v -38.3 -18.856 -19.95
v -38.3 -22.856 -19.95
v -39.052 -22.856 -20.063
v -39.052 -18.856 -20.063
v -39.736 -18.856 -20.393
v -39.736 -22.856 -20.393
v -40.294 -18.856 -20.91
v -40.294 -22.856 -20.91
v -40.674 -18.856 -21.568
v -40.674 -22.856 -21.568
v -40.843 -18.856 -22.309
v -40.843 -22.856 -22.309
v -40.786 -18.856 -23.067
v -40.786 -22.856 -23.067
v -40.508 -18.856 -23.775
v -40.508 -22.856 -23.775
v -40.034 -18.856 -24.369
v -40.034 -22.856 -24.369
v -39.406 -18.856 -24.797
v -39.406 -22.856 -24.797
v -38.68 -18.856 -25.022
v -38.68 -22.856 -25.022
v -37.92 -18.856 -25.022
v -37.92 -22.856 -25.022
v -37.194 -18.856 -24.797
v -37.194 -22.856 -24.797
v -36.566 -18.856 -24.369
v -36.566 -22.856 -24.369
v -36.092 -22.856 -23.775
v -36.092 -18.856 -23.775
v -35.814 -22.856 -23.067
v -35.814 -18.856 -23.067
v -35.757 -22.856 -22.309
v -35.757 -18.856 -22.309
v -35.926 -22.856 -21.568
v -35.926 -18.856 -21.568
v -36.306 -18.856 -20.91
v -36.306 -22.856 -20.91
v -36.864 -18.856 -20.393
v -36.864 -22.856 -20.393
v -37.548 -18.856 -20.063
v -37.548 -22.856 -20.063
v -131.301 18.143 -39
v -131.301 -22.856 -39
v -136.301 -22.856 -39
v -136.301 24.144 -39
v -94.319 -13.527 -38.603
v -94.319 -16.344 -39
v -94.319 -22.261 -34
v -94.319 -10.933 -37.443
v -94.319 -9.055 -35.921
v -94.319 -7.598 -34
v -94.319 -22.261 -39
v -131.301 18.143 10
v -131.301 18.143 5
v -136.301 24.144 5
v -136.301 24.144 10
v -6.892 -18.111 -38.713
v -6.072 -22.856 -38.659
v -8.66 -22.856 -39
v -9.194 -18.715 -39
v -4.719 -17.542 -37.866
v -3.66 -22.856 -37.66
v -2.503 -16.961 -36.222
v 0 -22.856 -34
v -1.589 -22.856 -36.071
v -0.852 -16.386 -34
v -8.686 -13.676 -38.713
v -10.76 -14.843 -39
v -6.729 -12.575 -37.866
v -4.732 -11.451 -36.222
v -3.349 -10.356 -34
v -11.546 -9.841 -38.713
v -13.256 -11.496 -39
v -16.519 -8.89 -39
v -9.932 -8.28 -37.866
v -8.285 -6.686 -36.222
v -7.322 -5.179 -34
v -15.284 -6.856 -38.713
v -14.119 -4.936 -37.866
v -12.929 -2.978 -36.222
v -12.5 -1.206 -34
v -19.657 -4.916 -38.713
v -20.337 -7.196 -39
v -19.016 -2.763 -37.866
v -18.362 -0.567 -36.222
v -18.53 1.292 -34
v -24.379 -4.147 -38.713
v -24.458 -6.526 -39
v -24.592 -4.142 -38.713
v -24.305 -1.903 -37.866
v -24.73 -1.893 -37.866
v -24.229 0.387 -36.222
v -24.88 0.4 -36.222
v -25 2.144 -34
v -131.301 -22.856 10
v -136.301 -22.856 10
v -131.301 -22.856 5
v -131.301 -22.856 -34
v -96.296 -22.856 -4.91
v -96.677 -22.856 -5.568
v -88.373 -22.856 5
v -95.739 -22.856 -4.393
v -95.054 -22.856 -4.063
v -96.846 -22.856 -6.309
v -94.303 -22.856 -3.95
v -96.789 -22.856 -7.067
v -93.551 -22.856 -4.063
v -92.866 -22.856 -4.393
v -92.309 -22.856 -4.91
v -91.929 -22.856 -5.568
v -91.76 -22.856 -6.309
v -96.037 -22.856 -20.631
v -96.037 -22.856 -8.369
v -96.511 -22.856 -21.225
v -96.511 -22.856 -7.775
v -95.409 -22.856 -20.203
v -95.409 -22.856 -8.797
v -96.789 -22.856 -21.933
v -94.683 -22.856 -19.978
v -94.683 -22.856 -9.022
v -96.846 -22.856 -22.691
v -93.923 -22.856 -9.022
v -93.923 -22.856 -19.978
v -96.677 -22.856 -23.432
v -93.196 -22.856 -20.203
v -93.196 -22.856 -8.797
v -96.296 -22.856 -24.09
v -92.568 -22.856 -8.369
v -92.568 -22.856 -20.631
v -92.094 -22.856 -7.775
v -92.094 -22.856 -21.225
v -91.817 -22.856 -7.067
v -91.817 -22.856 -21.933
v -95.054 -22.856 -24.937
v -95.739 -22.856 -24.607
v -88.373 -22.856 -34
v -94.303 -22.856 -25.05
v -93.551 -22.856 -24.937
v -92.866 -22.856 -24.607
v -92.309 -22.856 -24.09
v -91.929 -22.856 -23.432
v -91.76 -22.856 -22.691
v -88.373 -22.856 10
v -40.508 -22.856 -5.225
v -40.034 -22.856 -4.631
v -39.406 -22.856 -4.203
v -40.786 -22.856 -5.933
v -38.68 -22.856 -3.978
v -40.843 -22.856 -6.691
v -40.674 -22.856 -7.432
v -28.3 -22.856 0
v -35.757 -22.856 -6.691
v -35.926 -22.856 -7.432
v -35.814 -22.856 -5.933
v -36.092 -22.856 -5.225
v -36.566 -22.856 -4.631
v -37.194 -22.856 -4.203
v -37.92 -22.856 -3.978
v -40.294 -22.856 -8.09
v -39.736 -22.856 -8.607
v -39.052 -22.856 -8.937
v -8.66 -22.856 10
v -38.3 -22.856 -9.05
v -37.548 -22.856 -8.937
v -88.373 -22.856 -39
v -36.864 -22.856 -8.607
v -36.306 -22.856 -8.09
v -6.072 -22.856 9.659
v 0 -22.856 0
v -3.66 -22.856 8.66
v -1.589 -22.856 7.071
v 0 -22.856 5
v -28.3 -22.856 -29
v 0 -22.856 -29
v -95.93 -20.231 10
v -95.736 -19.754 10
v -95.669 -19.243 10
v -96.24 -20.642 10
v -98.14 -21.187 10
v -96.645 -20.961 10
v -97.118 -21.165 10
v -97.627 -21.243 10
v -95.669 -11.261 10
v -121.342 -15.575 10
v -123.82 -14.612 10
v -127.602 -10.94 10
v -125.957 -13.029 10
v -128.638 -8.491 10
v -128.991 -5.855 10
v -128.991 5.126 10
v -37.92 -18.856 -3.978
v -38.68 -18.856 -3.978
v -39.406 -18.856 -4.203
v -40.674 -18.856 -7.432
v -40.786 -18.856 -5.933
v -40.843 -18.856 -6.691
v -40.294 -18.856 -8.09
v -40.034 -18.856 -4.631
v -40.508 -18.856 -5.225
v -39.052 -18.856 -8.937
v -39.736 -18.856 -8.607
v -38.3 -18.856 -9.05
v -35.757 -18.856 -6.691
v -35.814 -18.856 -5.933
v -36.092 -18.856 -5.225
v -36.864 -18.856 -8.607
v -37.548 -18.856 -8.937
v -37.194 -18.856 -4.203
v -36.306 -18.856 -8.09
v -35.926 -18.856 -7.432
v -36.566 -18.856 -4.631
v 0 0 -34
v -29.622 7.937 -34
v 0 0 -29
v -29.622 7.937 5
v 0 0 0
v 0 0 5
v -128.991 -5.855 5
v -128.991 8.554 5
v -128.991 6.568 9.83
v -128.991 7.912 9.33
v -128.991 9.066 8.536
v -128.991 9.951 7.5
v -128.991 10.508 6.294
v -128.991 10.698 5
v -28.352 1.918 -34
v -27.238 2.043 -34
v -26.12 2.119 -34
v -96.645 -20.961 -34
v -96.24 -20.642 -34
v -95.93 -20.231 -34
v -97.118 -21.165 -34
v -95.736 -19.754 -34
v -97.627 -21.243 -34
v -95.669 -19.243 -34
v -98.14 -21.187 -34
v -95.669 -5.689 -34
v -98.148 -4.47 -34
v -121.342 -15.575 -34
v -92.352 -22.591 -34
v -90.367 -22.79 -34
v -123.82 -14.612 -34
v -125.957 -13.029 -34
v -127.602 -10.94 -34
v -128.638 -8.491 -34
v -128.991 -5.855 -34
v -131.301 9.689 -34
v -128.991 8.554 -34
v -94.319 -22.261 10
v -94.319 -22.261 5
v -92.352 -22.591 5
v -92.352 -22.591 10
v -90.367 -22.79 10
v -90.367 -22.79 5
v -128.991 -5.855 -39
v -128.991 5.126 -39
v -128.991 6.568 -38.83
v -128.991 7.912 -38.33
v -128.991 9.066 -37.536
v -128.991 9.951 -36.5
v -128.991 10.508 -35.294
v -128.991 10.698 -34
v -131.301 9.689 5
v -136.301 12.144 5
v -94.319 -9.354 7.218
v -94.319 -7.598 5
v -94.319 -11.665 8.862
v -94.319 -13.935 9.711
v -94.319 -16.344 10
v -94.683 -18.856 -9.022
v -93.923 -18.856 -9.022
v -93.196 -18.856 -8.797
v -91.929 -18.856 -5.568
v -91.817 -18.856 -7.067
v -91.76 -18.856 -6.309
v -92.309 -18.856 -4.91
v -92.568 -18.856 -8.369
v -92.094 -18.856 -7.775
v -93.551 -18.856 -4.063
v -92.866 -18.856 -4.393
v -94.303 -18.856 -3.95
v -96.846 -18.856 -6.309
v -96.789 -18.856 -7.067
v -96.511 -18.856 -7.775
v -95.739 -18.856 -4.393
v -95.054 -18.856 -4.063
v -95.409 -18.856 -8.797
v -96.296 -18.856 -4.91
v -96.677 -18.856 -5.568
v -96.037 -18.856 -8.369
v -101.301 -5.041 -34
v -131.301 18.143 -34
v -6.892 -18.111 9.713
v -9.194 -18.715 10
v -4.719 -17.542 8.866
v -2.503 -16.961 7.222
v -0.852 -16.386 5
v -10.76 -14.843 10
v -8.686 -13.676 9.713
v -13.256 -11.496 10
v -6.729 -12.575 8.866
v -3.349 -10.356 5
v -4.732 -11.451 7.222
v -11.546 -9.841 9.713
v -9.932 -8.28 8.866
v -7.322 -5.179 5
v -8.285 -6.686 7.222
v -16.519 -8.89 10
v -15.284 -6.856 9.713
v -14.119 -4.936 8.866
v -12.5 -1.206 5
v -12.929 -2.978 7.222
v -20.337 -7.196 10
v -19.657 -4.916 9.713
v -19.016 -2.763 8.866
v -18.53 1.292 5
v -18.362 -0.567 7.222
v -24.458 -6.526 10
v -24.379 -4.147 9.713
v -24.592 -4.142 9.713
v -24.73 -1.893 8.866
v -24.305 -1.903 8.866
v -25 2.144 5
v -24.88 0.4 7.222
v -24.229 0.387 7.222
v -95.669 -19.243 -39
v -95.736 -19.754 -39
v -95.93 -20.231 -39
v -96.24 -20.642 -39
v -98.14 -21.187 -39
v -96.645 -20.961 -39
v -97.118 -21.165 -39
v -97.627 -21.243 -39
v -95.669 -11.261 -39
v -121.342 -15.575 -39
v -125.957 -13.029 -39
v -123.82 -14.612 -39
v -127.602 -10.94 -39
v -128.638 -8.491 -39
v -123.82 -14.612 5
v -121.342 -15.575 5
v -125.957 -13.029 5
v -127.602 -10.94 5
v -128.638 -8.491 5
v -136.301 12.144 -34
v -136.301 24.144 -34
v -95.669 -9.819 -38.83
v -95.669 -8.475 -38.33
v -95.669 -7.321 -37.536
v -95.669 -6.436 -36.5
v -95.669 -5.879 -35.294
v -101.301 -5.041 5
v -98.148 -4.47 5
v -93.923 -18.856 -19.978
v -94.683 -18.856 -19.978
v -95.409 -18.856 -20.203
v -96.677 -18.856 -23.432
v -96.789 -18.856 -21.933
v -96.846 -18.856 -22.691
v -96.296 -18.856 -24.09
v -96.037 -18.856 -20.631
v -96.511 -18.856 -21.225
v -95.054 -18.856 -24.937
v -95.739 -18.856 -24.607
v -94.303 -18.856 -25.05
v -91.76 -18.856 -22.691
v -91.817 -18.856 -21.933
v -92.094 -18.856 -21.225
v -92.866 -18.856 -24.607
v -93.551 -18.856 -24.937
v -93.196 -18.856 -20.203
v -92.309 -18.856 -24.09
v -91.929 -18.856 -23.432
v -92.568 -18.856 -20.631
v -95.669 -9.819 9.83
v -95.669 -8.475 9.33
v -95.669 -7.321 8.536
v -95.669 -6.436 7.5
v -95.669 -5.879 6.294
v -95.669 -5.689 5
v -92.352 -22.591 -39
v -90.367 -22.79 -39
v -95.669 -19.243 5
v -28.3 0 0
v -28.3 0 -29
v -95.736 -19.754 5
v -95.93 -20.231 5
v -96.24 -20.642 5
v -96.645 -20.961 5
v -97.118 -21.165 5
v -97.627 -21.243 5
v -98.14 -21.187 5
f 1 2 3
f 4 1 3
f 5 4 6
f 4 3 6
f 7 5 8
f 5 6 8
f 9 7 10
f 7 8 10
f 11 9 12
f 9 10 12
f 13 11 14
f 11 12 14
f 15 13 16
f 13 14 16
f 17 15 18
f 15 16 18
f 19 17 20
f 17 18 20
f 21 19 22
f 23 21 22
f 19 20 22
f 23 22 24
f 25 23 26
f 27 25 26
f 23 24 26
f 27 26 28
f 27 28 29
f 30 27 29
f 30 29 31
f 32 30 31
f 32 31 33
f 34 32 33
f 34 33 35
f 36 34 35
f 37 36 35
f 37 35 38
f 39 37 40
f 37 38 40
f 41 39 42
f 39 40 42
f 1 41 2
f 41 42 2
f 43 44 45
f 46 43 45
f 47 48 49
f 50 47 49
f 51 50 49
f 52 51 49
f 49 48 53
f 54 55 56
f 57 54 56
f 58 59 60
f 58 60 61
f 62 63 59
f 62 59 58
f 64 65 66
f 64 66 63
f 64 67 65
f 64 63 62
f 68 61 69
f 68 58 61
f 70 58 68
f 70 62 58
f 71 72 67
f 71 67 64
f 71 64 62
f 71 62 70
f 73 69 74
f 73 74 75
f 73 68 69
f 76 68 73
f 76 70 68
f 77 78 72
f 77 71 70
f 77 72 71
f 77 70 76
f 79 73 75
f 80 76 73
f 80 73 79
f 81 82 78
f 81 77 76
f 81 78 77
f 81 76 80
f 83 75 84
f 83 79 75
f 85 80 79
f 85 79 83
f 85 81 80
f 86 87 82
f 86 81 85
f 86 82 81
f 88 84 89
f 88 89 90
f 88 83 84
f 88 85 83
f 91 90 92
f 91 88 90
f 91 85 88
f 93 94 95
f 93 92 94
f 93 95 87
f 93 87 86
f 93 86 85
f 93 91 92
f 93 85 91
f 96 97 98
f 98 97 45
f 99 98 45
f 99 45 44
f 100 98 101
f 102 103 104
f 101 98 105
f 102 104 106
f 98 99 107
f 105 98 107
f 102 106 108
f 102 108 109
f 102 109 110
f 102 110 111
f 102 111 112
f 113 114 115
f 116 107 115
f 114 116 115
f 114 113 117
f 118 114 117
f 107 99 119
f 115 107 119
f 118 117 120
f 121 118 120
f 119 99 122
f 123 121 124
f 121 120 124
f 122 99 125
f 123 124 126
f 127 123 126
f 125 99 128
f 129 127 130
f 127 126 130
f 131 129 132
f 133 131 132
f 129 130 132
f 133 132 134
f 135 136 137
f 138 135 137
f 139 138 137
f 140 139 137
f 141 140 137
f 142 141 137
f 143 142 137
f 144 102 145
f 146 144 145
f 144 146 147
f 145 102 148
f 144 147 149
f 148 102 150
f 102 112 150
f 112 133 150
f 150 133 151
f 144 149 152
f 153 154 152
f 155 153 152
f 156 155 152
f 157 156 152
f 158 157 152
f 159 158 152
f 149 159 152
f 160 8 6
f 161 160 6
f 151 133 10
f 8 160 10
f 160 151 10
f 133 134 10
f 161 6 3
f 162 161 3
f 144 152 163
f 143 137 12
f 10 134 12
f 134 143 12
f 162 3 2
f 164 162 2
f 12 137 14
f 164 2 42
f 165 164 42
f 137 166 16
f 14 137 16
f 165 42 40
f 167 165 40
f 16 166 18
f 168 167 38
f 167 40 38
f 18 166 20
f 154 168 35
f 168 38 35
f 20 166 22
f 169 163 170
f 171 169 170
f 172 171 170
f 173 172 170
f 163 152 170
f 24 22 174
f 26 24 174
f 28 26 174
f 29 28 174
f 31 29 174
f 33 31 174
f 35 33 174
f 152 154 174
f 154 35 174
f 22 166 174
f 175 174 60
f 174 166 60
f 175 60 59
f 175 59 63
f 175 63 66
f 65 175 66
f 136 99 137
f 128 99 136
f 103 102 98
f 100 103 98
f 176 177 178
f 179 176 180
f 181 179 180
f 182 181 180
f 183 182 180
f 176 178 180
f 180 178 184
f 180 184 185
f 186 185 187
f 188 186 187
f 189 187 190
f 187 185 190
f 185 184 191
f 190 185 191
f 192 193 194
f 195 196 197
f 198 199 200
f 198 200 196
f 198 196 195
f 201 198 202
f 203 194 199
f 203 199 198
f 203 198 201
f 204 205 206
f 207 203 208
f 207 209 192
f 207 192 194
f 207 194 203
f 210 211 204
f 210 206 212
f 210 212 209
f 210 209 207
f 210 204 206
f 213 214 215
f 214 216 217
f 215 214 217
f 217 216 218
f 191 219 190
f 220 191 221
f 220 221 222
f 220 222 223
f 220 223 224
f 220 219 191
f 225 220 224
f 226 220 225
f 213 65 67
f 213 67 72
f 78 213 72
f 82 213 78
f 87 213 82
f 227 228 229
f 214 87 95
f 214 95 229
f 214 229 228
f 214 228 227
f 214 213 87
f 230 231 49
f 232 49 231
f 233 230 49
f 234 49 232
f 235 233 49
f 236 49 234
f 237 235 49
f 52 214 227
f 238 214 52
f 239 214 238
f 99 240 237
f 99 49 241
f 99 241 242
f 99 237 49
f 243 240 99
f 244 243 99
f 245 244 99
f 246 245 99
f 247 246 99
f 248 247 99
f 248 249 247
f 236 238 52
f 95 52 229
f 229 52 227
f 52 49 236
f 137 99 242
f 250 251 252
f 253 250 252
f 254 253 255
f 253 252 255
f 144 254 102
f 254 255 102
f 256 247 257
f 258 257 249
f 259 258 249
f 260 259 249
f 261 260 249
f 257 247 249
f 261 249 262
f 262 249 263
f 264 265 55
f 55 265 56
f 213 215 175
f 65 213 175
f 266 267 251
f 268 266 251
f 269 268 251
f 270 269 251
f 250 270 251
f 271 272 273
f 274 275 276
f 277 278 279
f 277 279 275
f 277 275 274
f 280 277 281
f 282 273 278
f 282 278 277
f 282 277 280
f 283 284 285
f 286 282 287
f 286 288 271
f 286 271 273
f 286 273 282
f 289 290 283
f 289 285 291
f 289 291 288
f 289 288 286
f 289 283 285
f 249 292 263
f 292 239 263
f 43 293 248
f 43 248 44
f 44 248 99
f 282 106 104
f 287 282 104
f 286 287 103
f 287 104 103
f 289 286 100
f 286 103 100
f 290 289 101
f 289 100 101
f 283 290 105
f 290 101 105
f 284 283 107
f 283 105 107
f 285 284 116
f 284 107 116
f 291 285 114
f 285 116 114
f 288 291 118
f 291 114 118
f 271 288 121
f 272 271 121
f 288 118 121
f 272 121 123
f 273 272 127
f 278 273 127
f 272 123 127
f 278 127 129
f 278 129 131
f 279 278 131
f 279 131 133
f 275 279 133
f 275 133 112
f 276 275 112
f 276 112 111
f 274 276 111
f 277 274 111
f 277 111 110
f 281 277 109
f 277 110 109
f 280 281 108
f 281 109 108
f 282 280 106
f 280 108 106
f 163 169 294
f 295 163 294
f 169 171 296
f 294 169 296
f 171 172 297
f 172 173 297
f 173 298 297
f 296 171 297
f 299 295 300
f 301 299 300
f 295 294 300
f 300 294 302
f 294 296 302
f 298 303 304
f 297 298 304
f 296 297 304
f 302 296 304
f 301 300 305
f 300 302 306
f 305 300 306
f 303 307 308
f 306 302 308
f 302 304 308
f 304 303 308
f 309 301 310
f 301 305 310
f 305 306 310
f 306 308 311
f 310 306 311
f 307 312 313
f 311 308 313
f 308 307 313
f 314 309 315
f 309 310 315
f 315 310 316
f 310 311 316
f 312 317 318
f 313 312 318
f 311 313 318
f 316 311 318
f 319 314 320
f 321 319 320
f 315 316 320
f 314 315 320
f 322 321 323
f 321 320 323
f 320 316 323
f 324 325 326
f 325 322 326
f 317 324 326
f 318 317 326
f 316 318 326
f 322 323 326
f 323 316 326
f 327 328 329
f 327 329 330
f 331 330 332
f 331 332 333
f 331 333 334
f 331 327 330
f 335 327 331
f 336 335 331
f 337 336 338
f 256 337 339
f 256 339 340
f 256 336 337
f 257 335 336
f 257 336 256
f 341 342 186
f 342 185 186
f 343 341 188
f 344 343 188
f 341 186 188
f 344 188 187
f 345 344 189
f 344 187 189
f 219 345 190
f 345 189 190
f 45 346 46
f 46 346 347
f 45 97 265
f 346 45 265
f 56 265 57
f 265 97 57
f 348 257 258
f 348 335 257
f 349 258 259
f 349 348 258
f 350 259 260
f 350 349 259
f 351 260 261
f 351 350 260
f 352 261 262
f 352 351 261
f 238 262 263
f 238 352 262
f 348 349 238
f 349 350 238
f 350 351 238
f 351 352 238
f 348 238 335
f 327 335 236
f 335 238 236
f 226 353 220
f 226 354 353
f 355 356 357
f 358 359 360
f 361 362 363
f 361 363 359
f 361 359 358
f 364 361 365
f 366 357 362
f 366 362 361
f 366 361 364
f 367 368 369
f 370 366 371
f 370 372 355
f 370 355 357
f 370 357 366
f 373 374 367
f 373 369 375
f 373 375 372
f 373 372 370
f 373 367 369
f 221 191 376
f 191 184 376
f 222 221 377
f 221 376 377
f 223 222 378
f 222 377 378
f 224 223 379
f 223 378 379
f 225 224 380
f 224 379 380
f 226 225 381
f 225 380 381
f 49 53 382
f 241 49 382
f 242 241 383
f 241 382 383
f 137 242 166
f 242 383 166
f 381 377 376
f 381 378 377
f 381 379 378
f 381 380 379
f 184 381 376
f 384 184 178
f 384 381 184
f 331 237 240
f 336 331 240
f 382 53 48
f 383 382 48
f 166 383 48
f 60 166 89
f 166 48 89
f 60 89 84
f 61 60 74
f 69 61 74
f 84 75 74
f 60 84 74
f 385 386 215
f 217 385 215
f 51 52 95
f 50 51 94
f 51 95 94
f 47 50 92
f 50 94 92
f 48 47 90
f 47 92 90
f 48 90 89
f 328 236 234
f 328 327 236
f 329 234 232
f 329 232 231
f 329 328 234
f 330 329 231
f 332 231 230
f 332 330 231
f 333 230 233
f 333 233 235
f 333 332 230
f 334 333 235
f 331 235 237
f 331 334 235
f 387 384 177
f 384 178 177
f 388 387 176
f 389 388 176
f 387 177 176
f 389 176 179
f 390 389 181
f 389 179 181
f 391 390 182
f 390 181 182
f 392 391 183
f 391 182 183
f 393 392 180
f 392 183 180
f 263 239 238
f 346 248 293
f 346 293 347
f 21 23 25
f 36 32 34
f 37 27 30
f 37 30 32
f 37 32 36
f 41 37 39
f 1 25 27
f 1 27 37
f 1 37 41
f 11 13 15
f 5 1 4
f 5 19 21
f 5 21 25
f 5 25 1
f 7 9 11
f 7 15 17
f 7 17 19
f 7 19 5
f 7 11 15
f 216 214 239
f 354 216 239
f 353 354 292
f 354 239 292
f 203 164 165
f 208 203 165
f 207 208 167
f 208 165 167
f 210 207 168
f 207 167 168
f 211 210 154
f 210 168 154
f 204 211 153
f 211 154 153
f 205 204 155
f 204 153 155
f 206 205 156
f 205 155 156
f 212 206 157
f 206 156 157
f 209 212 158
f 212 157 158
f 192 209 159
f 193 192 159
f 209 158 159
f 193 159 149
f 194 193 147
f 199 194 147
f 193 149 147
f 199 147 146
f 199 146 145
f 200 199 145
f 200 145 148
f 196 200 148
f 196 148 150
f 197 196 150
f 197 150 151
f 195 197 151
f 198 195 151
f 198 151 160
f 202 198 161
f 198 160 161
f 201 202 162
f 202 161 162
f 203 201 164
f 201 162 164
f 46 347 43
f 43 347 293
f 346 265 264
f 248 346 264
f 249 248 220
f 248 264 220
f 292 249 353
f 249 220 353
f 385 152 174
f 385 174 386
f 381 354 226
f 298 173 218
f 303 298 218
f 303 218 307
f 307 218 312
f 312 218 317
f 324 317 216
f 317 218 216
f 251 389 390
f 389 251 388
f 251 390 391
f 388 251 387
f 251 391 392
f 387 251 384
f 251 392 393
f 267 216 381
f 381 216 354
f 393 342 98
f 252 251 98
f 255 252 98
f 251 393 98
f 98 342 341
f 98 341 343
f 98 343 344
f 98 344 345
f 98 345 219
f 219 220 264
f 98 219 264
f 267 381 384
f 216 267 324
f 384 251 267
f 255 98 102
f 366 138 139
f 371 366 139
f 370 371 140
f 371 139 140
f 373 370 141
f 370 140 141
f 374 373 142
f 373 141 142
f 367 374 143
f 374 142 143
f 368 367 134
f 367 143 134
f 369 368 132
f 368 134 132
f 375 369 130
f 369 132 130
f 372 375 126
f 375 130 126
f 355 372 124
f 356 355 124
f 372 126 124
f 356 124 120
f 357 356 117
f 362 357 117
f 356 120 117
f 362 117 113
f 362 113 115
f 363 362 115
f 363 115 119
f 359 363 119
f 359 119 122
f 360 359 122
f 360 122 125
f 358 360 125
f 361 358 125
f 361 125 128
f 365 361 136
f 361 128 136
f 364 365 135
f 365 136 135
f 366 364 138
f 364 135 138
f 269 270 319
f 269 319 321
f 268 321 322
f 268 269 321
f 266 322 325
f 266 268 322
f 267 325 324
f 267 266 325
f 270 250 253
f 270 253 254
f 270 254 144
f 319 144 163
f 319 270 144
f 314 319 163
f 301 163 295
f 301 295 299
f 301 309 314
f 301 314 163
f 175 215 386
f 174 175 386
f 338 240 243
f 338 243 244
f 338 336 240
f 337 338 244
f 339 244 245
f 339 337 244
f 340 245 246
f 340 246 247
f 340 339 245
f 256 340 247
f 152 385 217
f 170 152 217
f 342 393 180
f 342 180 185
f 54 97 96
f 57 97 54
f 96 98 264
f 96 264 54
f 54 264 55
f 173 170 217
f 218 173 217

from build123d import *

# Parameters (mm, degrees)
BOSS_EXTRUDE1_DEPTH  = 5
BOSS_EXTRUDE3_DEPTH  = 29
SKETCH7_R            = 2.55
CUT_EXTRUDE1_DEPTH   = 4
BOSS_EXTRUDE4_DEPTH  = 5
CUT_EXTRUDE2_DEPTH   = 50
BOSS_EXTRUDE5_DEPTH  = 39
BOSS_EXTRUDE6_DEPTH  = 5
BOSS_EXTRUDE7_DEPTH  = 5
BOSS_EXTRUDE8_DEPTH  = 5
FILLET1_START        = -96.499038859
FILLET1_DEPTH        = 93.561345122
FILLET1_2_ANGLE      = 90
BOSS_EXTRUDE9_DEPTH  = 5
FILLET2_R            = 10
FILLET3_R            = 5
FILLET4_R            = 2
BOSS_EXTRUDE10_START = 5
BOSS_EXTRUDE10_DEPTH = 5
FILLET5_R            = 10
BOSS_EXTRUDE11_DEPTH = 5
FILLET6_R            = 10
FILLET7_R            = 5
FILLET8_R            = 2


with BuildPart() as part:
    # Sketch1 → Boss-Extrude1 (new body)
    with BuildSketch(Plane.XY):
        Polygon((0, 0), (-101.301402794, 27.143629071), (-101.301402794, -22.856370929), (0, -22.856370929), align=None)
    extrude(amount=BOSS_EXTRUDE1_DEPTH)

    # Sketch3 → Boss-Extrude3 (add)
    with BuildSketch(Plane(origin=(0, 0, 0), x_dir=(-1, 0, 0), z_dir=(0, 0, -1))):
        Polygon((101.301402794, 27.143629071), (101.301402794, -22.856370929), (28.3, -22.856370929), (28.3, 0), (0, 0), align=None)
    extrude(amount=BOSS_EXTRUDE3_DEPTH)

    # Sketch7 → Cut-Extrude1 (cut)
    with BuildSketch(Plane.XZ.offset(22.856370929)):
        with Locations(Location((-38.3, -6.5, 0), (0, 0, 270))):
            Circle(SKETCH7_R)
        with Locations(Location((-38.3, -22.5, 0), (0, 0, 90))):
            Circle(SKETCH7_R)
        with Locations(Location((-94.302805589, -22.5, 0), (0, 0, 270))):
            Circle(SKETCH7_R)
        with Locations(Location((-94.302805589, -6.5, 0), (0, 0, 90))):
            Circle(SKETCH7_R)
    extrude(amount=-CUT_EXTRUDE1_DEPTH, mode=Mode.SUBTRACT)

    # Sketch8 → Boss-Extrude4 (add)
    with BuildSketch(Plane(origin=(0, 0, -29), x_dir=(-1, 0, 0), z_dir=(0, 0, -1))):
        Polygon((0, 0), (0, -22.856370929), (28.3, -22.856370929), (101.301402794, -22.856370929), (101.301402794, 27.143629071), align=None)
    extrude(amount=BOSS_EXTRUDE4_DEPTH)

    # Sketch9 → Cut-Extrude2 (cut)
    with BuildSketch(Plane(origin=(0, 0, -34), x_dir=(-1, 0, 0), z_dir=(0, 0, -1))):
        Polygon((101.301402794, 27.143629071), (29.621530414, 7.937065153), (101.301402794, -5.041318946), align=None)
    extrude(amount=-CUT_EXTRUDE2_DEPTH, mode=Mode.SUBTRACT)

    # Sketch10 → Boss-Extrude5 (add)
    with BuildSketch(Plane.XY.offset(5)):
        Polygon((-101.301402794, -22.856370929), (-136.301402794, -22.856370929), (-136.301402794, 12.143629071), (-101.301402794, -5.041318946), align=None)
    extrude(amount=-BOSS_EXTRUDE5_DEPTH)

    # Sketch11 → Boss-Extrude6 (add)
    with BuildSketch(Plane.XY.offset(5)):
        Polygon((-136.301402794, -22.856370929), (-131.301402794, -22.856370929), (-131.301402794, 18.143473933), (-136.301402794, 24.143629071), align=None)
    extrude(amount=BOSS_EXTRUDE6_DEPTH)

    # Sketch12 → Boss-Extrude7 (add)
    with BuildSketch(Plane(origin=(0, 0, -34), x_dir=(-1, 0, 0), z_dir=(0, 0, -1))):
        Polygon((136.301402794, -22.856370929), (136.301402794, 24.143629071), (131.301402794, 18.143473933), (131.301402794, -22.856370929), align=None)
    extrude(amount=BOSS_EXTRUDE7_DEPTH)

    # Sketch13 → Boss-Extrude8 (add)
    with BuildSketch(Plane.XY.offset(5)):
        with BuildLine():
            ThreePointArc((0, -22.856370929), (-7.32233047, -5.178701399), (-25, 2.143629071))
            Line((-25, 2.143629071), (-94.318764812, -7.598487996))
            Line((-94.318764812, -7.598487996), (-94.318764812, -22.261326085))
            ThreePointArc((-94.318764812, -22.261326085), (-91.360881343, -22.707239046), (-88.373294914, -22.856370929))
            Line((-88.373294914, -22.856370929), (0, -22.856370929))
        make_face()
    extrude(amount=BOSS_EXTRUDE8_DEPTH)

    # Fillet1: read off the stored shape, not the designer's step
    # Fillet1 outline → Fillet1 (cut)
    with BuildSketch(Plane(origin=(0, 0, 0), x_dir=(-0.13917310096006896, 0.9902680687415698, 0), z_dir=(0.9902680687415698, 0.13917310096006896, 0)).offset(FILLET1_START)):
        with BuildLine():
            ThreePointArc((-3.058159094, 10), (1.941840906, 8.660254038), (5.602094944, 5))
            Line((5.602094944, 5), (5.602094944, 10))
            Line((5.602094944, 10), (-3.058159094, 10))
        make_face()
    extrude(amount=FILLET1_DEPTH, mode=Mode.SUBTRACT)

    # Fillet1 2 outline → Fillet1 2 (revolve, cut)
    with BuildSketch(Plane(origin=(-25, -22.856370929, 0), x_dir=(1, 0, 0), z_dir=(0, -1, 0))):
        with BuildLine():
            Line((25, 10), (16.339745962, 10))
            ThreePointArc((16.339745962, 10), (21.339745962, 8.660254038), (25, 5))
            Line((25, 5), (25, 10))
        make_face()
    revolve(axis=Axis((-25, -22.856370929, 0), (0, 0, 1)), revolution_arc=FILLET1_2_ANGLE, mode=Mode.SUBTRACT)

    # Sketch14 → Boss-Extrude9 (add)
    with BuildSketch(Plane.XY.offset(5)):
        Polygon((-128.991070269, 10.697688119), (-95.669410429, -5.689032412), (-95.669410429, -21.784370313), (-128.991070269, -13.724945051), align=None)
    extrude(amount=BOSS_EXTRUDE9_DEPTH)

    # Fillet2
    fillet2_edges = [part.edges().sort_by_distance(p)[0] for p in [
        (-128.991070269, -13.724945051, 7.5),
    ]]
    fillet(fillet2_edges, radius=FILLET2_R)

    # Fillet3
    fillet3_edges = [part.edges().sort_by_distance(p)[0] for p in [
        (-112.330240349, 2.504327853, 10),
    ]]
    fillet(fillet3_edges, radius=FILLET3_R - 0.0001)  # a hair under: the kernel refuses the full size

    # Fillet4
    fillet4_edges = [part.edges().sort_by_distance(p)[0] for p in [
        (-95.669410429, -21.784370313, 7.5),
    ]]
    fillet(fillet4_edges, radius=FILLET4_R)

    # Sketch15 → Boss-Extrude10 (add)
    with BuildSketch(Plane(origin=(0, 0, -34), x_dir=(-1, 0, 0), z_dir=(0, 0, -1)).offset(BOSS_EXTRUDE10_START)):
        with BuildLine():
            Line((88.373294914, -22.856370929), (80, -22.856370929))
            Line((80, -22.856370929), (0, -22.856370929))
            ThreePointArc((0, -22.856370929), (7.32233047, -5.178701399), (25, 2.143629071))
            Line((25, 2.143629071), (94.318764812, -7.598487996))
            Line((94.318764812, -7.598487996), (94.318764812, -22.261326085))
            ThreePointArc((94.318764812, -22.261326085), (91.360881343, -22.707239046), (88.373294914, -22.856370929))
        make_face()
    extrude(amount=-BOSS_EXTRUDE10_DEPTH)

    # Fillet5
    # the kernel refuses this fillet: 10 mm, written as the material it takes off along each edge
    with BuildSketch(Plane(origin=(-3.560067398, 5.156815095, -39), x_dir=(0, 0, 1), z_dir=(-0.9902680687415698, -0.13917310096006932, 0))) as fillet5_piece_1:
        with BuildLine():
            CenterArc((10, -8.660254038), FILLET5_R, 120, 60)
            Line((0, -8.660254038), (0, 0))
            Line((0, 0), (5, 0))
        make_face()
    extrude(amount=113.301270189, mode=Mode.SUBTRACT)
    # the kernel refuses this fillet: 10 mm, written as the material it takes off along each edge
    with BuildSketch(Plane(origin=(-25, -22.856370929, -39), x_dir=(0.6477837249350054, -0.7618242879492156, 0), z_dir=(-0.7618242879492156, -0.6477837249350054, 0))) as fillet5_2_piece_1:
        with BuildLine():
            CenterArc((16.339745962, 10), FILLET5_R, 270, 60)
            Line((25, 5), (25, 0))
            Line((25, 0), (16.339745962, 0))
        make_face()
    revolve(axis=Axis((-25, -22.856370929, -39), (0, 0, 1)), revolution_arc=147.330675393, mode=Mode.SUBTRACT)

    # Sketch16 → Boss-Extrude11 (add)
    with BuildSketch(Plane(origin=(0, 0, -34), x_dir=(-1, 0, 0), z_dir=(0, 0, -1))):
        Polygon((128.991070269, 10.697688119), (95.669410429, -5.689032412), (95.669410429, -21.784370313), (128.991070269, -13.724945051), align=None)
    extrude(amount=BOSS_EXTRUDE11_DEPTH)

    # Fillet6
    fillet6_edges = [part.edges().sort_by_distance(p)[0] for p in [
        (-128.991070269, -13.724945051, -36.5),
    ]]
    fillet(fillet6_edges, radius=FILLET6_R)

    # Fillet7
    fillet7_edges = [part.edges().sort_by_distance(p)[0] for p in [
        (-112.330240349, 2.504327853, -39),
    ]]
    fillet(fillet7_edges, radius=FILLET7_R - 0.0001)  # a hair under: the kernel refuses the full size

    # Fillet8
    fillet8_edges = [part.edges().sort_by_distance(p)[0] for p in [
        (-95.669410429, -21.784370313, -36.5),
    ]]
    fillet(fillet8_edges, radius=FILLET8_R)


solid = part.part
